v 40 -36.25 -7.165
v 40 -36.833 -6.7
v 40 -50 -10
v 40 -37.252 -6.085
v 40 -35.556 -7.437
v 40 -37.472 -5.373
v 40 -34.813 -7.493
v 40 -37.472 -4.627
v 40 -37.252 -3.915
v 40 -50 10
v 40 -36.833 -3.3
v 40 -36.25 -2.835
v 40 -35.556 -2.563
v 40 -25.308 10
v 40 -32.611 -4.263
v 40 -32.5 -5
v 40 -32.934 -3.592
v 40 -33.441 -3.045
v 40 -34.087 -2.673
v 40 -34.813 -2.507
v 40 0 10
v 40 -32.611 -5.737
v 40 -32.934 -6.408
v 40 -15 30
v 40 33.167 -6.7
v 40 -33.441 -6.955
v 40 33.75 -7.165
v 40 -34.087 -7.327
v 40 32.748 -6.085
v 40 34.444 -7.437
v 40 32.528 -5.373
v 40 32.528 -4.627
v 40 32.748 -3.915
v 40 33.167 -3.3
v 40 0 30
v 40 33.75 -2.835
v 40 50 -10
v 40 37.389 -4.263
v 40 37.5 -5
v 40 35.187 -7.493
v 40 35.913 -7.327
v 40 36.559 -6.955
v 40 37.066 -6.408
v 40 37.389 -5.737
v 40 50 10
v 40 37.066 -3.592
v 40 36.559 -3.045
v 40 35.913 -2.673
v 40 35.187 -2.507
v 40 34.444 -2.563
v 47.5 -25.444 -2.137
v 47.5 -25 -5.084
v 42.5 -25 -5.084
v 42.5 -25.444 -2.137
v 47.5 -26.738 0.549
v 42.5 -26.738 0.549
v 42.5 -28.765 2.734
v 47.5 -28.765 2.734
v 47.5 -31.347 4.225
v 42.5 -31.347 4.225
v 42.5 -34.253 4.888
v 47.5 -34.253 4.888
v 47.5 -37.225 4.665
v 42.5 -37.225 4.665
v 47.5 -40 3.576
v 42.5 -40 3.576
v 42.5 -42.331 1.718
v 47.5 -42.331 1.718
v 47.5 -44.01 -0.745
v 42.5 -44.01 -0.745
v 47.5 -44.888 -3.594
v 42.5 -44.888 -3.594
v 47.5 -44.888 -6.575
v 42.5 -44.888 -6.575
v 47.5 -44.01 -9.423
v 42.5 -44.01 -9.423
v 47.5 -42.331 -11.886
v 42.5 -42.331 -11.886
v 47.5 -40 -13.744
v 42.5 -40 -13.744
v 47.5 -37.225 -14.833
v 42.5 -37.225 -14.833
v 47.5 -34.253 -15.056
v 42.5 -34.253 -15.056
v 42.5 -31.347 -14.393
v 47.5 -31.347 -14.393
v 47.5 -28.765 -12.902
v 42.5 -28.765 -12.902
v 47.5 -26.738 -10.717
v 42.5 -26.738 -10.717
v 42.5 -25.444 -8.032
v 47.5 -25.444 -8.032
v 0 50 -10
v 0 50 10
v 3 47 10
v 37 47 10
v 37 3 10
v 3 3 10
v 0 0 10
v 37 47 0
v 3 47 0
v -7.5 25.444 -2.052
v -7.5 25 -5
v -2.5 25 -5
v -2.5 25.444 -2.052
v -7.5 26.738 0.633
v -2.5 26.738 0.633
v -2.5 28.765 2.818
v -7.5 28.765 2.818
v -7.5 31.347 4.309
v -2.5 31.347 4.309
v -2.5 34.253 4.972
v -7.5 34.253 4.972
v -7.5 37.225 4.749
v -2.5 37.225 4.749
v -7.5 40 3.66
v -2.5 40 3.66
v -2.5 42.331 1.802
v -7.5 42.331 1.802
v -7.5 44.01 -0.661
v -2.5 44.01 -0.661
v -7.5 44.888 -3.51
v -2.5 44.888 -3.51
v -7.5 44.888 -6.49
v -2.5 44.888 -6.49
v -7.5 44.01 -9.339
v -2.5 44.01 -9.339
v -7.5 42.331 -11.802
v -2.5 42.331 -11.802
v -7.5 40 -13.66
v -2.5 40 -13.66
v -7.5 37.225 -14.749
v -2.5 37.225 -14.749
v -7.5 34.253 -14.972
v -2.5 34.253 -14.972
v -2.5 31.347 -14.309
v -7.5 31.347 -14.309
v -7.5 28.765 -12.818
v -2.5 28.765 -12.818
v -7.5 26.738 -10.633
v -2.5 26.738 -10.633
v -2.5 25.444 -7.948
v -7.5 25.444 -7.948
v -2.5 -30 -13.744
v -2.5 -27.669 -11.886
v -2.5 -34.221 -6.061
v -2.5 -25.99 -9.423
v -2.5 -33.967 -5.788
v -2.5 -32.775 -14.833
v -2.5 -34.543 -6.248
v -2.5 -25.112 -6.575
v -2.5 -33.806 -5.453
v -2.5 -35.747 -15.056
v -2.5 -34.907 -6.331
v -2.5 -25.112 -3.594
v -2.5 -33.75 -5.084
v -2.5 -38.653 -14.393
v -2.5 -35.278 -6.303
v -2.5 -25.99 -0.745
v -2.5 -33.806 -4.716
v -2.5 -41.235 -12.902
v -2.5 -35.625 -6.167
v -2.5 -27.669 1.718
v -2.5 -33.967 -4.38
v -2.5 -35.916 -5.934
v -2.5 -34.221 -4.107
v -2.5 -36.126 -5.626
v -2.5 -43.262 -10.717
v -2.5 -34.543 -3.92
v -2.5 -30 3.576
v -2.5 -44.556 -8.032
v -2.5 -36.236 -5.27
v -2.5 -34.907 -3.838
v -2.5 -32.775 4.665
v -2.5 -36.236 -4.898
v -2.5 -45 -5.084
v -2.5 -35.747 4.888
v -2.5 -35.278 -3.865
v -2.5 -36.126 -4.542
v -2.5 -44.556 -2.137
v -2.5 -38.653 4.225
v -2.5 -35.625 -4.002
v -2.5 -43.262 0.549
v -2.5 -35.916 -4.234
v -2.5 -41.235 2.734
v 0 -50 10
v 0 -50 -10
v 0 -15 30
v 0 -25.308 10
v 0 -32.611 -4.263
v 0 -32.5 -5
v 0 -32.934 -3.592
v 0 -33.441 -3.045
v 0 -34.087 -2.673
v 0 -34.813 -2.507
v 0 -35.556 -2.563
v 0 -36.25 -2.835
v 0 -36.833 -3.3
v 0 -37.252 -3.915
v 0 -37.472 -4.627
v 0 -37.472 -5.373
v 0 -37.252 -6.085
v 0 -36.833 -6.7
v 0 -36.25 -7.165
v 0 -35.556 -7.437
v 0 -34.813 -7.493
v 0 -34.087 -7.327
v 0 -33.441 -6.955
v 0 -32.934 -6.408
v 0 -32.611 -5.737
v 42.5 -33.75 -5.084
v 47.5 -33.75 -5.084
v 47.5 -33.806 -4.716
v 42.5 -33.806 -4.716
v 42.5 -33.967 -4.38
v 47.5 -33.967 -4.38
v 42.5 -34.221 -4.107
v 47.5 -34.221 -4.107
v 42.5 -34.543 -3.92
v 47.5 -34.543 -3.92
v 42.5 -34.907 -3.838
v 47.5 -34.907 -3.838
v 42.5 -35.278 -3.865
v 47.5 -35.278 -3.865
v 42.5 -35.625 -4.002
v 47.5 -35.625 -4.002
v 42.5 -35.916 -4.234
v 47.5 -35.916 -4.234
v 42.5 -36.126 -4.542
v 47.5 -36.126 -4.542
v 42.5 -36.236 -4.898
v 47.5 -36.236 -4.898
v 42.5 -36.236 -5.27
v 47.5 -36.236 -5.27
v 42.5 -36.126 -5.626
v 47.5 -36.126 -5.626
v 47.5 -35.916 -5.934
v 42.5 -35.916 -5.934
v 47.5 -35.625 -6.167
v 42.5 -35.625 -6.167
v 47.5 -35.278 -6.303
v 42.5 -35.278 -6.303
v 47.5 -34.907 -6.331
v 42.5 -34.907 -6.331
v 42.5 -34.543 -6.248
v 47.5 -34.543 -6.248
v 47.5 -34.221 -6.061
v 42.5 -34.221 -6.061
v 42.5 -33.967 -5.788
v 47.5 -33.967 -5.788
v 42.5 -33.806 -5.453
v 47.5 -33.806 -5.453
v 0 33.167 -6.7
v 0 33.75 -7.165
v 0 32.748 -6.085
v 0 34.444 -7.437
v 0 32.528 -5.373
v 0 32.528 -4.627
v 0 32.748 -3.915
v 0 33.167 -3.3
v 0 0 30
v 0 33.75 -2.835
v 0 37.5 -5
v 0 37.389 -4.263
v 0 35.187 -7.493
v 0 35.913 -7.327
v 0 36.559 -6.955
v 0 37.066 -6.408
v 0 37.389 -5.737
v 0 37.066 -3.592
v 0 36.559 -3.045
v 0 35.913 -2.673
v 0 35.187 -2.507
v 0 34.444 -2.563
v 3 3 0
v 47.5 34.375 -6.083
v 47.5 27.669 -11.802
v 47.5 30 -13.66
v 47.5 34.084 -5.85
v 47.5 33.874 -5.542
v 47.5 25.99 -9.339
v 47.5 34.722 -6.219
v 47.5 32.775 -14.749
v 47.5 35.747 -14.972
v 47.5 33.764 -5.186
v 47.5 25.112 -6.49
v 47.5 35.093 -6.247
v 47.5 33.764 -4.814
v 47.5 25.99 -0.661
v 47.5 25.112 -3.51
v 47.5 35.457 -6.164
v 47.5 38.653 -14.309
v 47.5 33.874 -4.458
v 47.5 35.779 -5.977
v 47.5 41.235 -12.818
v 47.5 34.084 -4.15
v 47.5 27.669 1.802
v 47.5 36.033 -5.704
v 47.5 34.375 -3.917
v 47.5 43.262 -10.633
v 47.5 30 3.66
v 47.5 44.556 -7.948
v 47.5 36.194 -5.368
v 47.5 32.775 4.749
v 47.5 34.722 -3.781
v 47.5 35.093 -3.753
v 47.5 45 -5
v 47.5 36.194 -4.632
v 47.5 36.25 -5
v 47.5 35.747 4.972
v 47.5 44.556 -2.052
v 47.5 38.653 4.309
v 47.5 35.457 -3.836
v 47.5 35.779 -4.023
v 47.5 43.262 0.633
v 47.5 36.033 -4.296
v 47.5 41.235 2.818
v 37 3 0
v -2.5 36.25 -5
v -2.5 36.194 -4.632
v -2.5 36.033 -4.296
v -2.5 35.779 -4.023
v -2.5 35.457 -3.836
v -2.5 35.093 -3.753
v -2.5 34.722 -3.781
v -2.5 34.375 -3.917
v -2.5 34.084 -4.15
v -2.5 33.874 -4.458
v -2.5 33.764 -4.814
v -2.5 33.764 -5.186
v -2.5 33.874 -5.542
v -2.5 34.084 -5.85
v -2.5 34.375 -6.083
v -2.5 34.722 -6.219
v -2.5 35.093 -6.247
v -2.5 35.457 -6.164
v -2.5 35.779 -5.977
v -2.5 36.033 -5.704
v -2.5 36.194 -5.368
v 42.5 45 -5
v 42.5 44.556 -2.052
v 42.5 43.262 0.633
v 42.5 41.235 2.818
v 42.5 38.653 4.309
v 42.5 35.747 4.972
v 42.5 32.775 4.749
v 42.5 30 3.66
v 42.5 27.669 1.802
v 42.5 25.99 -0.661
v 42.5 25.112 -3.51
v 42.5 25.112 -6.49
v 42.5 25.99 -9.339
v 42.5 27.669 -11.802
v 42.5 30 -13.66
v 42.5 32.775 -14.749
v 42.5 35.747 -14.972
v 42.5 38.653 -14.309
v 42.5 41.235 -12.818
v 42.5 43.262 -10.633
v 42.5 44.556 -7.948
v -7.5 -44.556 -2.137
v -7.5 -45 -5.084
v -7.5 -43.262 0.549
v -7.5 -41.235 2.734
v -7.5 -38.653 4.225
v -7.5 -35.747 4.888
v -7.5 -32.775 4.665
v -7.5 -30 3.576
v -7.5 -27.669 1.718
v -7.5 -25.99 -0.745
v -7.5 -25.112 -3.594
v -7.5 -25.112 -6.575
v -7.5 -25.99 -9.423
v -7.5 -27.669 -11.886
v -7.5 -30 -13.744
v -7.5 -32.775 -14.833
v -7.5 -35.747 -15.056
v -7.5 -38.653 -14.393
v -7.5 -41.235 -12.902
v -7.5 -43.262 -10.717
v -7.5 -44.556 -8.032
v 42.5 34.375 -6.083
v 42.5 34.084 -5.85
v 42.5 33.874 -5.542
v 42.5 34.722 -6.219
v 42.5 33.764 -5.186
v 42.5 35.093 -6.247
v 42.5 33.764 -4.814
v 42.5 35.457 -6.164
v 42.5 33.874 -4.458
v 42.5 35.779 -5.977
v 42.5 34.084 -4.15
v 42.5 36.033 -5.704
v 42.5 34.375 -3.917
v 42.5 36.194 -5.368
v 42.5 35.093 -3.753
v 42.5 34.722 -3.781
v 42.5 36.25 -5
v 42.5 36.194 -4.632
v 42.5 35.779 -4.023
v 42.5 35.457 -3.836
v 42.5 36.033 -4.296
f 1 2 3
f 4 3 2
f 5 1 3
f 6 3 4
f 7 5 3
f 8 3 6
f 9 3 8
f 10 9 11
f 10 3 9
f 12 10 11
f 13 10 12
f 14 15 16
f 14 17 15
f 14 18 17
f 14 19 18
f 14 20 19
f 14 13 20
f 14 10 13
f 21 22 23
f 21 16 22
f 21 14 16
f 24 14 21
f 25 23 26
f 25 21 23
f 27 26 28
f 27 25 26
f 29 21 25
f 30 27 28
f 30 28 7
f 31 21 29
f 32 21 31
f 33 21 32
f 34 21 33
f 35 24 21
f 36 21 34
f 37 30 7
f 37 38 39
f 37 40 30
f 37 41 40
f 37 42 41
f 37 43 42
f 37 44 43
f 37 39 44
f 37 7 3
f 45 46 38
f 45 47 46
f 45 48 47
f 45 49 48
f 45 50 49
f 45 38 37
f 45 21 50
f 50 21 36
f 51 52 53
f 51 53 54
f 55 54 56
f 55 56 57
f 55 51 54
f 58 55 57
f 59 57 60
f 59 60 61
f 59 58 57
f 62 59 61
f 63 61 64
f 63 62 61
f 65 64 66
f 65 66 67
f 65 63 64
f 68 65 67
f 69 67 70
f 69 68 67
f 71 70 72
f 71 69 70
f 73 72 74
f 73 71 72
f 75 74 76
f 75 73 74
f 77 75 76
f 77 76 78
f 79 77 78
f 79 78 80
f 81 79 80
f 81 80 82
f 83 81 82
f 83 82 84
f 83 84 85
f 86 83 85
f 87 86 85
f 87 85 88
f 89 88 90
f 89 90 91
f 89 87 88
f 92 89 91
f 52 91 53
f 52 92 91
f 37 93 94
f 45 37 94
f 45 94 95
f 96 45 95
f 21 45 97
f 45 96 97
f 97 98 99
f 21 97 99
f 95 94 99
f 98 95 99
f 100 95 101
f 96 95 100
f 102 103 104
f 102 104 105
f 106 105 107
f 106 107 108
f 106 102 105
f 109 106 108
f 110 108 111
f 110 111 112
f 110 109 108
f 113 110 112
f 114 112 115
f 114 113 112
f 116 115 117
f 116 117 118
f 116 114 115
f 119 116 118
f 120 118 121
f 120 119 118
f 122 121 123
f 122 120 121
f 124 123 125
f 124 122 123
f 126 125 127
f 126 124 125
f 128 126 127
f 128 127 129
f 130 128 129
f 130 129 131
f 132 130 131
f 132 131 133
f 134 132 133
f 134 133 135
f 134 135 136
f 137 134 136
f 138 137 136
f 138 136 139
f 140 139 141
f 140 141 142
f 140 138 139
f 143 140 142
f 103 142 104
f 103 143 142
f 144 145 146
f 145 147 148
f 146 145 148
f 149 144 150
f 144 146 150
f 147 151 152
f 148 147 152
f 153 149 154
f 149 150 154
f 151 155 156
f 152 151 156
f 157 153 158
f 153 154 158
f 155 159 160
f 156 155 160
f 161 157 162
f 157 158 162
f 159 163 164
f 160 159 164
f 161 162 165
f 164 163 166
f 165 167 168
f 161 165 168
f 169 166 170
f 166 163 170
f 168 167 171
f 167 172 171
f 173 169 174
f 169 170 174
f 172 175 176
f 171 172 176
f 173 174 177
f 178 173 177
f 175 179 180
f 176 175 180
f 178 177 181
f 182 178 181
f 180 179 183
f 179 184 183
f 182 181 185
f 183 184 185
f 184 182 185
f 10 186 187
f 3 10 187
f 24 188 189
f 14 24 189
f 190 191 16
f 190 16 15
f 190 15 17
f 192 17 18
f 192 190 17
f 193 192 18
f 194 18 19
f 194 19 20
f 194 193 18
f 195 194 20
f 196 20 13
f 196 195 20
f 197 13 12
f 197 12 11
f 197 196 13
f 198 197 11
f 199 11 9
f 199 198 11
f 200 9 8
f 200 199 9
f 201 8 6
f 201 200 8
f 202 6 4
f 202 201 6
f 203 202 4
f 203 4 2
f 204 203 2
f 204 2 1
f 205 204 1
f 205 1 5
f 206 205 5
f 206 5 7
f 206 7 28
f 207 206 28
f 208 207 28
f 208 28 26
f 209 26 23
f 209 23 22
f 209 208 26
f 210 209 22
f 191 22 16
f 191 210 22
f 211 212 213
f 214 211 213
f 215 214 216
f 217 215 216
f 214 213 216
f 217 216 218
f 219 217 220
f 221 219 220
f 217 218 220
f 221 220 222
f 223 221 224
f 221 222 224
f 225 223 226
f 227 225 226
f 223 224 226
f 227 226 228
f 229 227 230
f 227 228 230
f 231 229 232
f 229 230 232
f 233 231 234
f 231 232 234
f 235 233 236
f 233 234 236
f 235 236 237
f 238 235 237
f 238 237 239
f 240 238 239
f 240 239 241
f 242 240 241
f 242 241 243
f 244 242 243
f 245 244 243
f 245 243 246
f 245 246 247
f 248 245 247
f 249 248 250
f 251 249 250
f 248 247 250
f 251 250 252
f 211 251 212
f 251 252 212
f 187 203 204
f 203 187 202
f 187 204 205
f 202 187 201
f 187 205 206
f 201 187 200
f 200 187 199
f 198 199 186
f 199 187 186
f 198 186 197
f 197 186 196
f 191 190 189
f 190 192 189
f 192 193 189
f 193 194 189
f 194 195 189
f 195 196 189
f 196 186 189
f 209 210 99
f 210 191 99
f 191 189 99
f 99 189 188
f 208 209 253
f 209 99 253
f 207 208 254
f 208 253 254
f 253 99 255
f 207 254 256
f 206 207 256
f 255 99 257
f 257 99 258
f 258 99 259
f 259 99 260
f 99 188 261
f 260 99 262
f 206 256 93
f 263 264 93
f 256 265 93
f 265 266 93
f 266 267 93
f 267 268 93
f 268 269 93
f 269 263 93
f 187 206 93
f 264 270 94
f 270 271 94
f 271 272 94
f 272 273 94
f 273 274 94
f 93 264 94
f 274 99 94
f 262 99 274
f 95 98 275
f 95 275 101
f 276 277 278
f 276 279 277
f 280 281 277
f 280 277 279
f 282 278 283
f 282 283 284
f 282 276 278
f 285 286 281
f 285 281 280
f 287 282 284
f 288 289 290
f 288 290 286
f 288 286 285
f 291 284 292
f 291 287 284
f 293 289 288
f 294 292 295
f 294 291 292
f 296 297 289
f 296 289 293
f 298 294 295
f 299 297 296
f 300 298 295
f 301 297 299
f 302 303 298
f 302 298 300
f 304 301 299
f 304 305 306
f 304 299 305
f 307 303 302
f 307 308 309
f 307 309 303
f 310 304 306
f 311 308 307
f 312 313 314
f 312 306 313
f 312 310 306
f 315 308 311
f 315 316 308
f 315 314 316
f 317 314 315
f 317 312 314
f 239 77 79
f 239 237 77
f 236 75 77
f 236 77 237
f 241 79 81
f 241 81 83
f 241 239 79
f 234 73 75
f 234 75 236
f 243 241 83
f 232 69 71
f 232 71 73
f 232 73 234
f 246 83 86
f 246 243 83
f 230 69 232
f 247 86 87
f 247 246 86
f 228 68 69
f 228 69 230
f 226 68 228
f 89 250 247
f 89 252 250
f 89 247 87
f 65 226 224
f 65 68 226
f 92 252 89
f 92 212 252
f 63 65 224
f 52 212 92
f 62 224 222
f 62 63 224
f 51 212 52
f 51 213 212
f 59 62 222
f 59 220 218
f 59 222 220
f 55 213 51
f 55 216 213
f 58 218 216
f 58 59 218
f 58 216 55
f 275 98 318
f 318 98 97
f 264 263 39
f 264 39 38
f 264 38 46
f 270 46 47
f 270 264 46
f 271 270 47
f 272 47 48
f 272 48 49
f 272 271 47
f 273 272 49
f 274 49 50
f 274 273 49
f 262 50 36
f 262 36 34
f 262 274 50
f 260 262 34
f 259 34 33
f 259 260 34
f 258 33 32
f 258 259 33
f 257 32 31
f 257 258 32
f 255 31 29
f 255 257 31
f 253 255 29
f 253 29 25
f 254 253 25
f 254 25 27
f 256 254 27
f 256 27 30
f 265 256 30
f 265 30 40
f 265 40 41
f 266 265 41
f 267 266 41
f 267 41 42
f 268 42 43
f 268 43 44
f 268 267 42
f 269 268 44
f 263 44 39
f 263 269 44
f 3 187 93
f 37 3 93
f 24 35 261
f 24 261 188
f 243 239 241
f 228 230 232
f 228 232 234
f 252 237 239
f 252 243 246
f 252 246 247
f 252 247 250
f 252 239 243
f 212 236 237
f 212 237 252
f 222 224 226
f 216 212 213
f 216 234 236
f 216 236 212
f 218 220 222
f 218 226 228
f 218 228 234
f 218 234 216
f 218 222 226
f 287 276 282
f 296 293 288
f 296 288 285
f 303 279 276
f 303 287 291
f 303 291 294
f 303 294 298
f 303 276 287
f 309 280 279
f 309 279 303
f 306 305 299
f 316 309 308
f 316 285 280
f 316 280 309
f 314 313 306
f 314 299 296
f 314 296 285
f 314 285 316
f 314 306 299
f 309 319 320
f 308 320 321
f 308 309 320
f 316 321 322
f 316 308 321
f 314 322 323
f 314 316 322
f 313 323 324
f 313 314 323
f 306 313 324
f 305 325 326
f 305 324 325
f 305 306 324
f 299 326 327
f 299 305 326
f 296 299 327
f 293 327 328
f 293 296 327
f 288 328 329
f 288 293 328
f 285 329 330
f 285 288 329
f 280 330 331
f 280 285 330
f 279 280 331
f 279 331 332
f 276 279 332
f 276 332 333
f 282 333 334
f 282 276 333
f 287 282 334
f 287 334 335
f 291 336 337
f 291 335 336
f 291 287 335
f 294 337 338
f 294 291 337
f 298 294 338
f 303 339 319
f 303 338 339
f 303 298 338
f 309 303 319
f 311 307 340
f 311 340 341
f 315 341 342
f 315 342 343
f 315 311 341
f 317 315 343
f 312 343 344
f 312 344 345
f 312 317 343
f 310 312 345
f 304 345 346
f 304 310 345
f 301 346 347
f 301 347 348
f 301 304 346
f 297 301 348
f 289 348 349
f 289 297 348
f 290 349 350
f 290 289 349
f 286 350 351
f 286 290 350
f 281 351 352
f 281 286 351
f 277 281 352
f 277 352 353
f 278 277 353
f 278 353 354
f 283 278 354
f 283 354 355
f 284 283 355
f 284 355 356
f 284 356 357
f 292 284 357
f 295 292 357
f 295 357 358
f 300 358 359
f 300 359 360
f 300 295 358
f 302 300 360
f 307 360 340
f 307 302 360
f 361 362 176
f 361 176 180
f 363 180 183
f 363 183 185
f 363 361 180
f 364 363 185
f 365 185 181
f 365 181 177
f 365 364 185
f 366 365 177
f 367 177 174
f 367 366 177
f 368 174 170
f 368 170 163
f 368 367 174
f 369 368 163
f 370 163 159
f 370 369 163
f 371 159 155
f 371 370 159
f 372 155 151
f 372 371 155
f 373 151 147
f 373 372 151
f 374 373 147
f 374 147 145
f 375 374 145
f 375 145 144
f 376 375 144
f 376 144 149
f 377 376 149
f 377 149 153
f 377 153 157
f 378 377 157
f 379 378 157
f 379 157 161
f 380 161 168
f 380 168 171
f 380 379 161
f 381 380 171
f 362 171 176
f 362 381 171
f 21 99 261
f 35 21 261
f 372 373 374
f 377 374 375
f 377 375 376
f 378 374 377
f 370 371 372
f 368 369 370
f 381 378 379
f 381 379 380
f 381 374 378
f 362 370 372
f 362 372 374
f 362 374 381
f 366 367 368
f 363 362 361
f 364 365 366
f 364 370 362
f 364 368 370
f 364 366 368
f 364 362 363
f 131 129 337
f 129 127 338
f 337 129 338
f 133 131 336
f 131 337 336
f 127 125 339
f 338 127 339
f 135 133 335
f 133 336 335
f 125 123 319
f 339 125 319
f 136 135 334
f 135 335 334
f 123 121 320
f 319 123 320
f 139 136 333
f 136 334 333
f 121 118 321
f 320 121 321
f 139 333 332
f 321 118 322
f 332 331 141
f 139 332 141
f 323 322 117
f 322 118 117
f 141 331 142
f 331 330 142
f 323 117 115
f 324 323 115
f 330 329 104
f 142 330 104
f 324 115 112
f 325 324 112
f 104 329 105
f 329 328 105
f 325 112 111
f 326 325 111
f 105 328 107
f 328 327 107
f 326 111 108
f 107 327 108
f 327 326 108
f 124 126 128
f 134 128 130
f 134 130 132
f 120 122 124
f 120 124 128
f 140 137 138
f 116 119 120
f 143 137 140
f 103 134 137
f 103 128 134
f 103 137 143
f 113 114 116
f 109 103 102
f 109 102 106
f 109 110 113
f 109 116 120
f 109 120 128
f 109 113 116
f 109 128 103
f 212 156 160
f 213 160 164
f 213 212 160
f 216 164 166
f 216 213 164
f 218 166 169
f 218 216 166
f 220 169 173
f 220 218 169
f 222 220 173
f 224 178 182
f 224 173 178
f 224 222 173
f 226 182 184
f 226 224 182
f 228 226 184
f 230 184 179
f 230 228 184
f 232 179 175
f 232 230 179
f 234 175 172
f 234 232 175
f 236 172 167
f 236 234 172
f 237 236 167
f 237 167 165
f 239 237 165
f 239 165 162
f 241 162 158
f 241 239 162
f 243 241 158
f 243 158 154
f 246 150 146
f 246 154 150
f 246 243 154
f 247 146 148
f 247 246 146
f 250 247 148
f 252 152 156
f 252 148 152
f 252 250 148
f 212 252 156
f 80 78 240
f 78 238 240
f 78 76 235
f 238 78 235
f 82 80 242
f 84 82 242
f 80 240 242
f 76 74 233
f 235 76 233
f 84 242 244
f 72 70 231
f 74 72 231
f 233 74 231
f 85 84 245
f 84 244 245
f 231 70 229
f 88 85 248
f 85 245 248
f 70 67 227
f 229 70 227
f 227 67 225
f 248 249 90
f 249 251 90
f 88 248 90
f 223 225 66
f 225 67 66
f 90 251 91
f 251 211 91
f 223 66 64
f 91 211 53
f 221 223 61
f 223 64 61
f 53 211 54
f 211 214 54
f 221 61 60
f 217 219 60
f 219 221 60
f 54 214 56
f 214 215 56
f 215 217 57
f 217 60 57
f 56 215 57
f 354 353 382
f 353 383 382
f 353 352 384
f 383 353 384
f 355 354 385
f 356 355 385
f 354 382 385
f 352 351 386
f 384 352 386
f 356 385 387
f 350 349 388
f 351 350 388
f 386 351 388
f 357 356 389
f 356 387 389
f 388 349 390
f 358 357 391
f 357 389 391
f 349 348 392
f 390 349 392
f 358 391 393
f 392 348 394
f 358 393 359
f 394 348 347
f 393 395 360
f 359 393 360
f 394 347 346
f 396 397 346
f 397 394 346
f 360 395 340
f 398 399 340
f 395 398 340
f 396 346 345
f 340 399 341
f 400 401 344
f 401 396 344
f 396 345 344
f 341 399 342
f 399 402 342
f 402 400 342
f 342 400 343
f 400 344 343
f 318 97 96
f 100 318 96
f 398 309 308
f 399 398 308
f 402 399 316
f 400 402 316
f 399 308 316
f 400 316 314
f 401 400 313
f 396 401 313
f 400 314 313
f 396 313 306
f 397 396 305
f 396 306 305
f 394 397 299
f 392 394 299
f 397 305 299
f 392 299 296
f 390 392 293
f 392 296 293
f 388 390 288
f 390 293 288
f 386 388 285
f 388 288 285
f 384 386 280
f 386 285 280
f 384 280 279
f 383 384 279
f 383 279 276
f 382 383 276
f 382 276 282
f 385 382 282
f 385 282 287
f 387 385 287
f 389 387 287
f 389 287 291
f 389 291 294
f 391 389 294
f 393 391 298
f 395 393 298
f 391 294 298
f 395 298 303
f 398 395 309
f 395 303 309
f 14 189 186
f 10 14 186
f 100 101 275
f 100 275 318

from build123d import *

# Parameters (mm, degrees)
F0_R      = 2.5
F1_DEPTH  = 40
F2_W      = 34
F2_H      = 44
F3_DEPTH  = 10
F4_R      = 1.25
F5_DEPTH  = 47.5
F5_FACE_R = 1.25
F6_DEPTH  = 7.5
F7_R      = 1.25
F8_DEPTH  = 47.5
F8_FACE_R = 1.25
F9_DEPTH  = 7.5
F10_R     = 10
F10_R_2   = 1.25
F11_DEPTH = 5
F12_R     = 10
F12_R_2   = 1.25
F14_DEPTH = 5
F15_R     = 10
F15_R_2   = 1.25
F16_DEPTH = 5
F17_R     = 10
F17_R_2   = 1.25
F18_DEPTH = 5


with BuildPart() as f1:
    # F0 (on Right) → F1 (new body)
    with BuildSketch(Plane.YZ):
        Polygon((50, -10), (50, 10), (0, 10), (-25.30775, 10), (-50, 10), (-50, -10), align=None)
        with Locations((-35, -5)):
            Circle(F0_R, mode=Mode.SUBTRACT)
        with Locations((35, -5)):
            Circle(F0_R, mode=Mode.SUBTRACT)
        Polygon((-25.30775, 10), (0, 10), (0, 30), (-15, 30), align=None)
    extrude(amount=F1_DEPTH)

    # F2 (on face) → F3 (cut)
    with BuildSketch(Plane.XY.offset(10)):
        with Locations((20, 25)):
            Rectangle(F2_W, F2_H)
    extrude(amount=-F3_DEPTH, mode=Mode.SUBTRACT)


with BuildPart() as f5:
    # F4 (on face) → F5 (new body)
    with BuildSketch(Plane.YZ.offset(40)):
        with Locations((-35, -5.084084)):
            Circle(F4_R)
    extrude(amount=-F5_DEPTH)

    # F5_face (on face) → F6 (join)
    with BuildSketch(Plane(origin=(40, -35, -5.084084), x_dir=(0, 1, 0), z_dir=(1, 0, 0))):
        Circle(F5_FACE_R)
    extrude(amount=F6_DEPTH)

    # F15 (on face) → F16 (join)
    with BuildSketch(Plane(origin=(-7.5, 0, 0), x_dir=(0, -1, 0), z_dir=(-1, 0, 0))):
        with Locations((35, -5.084084)):
            Circle(F15_R)
        with Locations((35, -5.084084)):
            Circle(F15_R_2, mode=Mode.SUBTRACT)
    extrude(amount=-F16_DEPTH)


with BuildPart() as f8:
    # F7 (on face) → F8 (new body)
    with BuildSketch(Plane.YZ.offset(40)):
        with Locations((35, -5)):
            Circle(F7_R)
    extrude(amount=-F8_DEPTH)

    # F8_face (on face) → F9 (join)
    with BuildSketch(Plane(origin=(40, 35, -5), x_dir=(0, 1, 0), z_dir=(1, 0, 0))):
        Circle(F8_FACE_R)
    extrude(amount=F9_DEPTH)

    # F17 (on face) → F18 (join)
    with BuildSketch(Plane(origin=(-7.5, 0, 0), x_dir=(0, -1, 0), z_dir=(-1, 0, 0))):
        with Locations((-35, -5)):
            Circle(F17_R)
        with Locations((-35, -5)):
            Circle(F17_R_2, mode=Mode.SUBTRACT)
    extrude(amount=-F18_DEPTH)


with BuildPart() as f11:
    # F10 (on face) → F11 (new body)
    with BuildSketch(Plane.YZ.offset(47.5)):
        with Locations((-35, -5.084084)):
            Circle(F10_R)
        with Locations((-35, -5.084084)):
            Circle(F10_R_2, mode=Mode.SUBTRACT)
    extrude(amount=-F11_DEPTH)


with BuildPart() as f14:
    # F12 (on face) → F14 (new body)
    with BuildSketch(Plane.YZ.offset(47.5)):
        with Locations((35, -5)):
            Circle(F12_R)
        with Locations((35, -5)):
            Circle(F12_R_2, mode=Mode.SUBTRACT)
    extrude(amount=-F14_DEPTH)


solid = Compound([f1.part, f5.part, f8.part, f11.part, f14.part])
